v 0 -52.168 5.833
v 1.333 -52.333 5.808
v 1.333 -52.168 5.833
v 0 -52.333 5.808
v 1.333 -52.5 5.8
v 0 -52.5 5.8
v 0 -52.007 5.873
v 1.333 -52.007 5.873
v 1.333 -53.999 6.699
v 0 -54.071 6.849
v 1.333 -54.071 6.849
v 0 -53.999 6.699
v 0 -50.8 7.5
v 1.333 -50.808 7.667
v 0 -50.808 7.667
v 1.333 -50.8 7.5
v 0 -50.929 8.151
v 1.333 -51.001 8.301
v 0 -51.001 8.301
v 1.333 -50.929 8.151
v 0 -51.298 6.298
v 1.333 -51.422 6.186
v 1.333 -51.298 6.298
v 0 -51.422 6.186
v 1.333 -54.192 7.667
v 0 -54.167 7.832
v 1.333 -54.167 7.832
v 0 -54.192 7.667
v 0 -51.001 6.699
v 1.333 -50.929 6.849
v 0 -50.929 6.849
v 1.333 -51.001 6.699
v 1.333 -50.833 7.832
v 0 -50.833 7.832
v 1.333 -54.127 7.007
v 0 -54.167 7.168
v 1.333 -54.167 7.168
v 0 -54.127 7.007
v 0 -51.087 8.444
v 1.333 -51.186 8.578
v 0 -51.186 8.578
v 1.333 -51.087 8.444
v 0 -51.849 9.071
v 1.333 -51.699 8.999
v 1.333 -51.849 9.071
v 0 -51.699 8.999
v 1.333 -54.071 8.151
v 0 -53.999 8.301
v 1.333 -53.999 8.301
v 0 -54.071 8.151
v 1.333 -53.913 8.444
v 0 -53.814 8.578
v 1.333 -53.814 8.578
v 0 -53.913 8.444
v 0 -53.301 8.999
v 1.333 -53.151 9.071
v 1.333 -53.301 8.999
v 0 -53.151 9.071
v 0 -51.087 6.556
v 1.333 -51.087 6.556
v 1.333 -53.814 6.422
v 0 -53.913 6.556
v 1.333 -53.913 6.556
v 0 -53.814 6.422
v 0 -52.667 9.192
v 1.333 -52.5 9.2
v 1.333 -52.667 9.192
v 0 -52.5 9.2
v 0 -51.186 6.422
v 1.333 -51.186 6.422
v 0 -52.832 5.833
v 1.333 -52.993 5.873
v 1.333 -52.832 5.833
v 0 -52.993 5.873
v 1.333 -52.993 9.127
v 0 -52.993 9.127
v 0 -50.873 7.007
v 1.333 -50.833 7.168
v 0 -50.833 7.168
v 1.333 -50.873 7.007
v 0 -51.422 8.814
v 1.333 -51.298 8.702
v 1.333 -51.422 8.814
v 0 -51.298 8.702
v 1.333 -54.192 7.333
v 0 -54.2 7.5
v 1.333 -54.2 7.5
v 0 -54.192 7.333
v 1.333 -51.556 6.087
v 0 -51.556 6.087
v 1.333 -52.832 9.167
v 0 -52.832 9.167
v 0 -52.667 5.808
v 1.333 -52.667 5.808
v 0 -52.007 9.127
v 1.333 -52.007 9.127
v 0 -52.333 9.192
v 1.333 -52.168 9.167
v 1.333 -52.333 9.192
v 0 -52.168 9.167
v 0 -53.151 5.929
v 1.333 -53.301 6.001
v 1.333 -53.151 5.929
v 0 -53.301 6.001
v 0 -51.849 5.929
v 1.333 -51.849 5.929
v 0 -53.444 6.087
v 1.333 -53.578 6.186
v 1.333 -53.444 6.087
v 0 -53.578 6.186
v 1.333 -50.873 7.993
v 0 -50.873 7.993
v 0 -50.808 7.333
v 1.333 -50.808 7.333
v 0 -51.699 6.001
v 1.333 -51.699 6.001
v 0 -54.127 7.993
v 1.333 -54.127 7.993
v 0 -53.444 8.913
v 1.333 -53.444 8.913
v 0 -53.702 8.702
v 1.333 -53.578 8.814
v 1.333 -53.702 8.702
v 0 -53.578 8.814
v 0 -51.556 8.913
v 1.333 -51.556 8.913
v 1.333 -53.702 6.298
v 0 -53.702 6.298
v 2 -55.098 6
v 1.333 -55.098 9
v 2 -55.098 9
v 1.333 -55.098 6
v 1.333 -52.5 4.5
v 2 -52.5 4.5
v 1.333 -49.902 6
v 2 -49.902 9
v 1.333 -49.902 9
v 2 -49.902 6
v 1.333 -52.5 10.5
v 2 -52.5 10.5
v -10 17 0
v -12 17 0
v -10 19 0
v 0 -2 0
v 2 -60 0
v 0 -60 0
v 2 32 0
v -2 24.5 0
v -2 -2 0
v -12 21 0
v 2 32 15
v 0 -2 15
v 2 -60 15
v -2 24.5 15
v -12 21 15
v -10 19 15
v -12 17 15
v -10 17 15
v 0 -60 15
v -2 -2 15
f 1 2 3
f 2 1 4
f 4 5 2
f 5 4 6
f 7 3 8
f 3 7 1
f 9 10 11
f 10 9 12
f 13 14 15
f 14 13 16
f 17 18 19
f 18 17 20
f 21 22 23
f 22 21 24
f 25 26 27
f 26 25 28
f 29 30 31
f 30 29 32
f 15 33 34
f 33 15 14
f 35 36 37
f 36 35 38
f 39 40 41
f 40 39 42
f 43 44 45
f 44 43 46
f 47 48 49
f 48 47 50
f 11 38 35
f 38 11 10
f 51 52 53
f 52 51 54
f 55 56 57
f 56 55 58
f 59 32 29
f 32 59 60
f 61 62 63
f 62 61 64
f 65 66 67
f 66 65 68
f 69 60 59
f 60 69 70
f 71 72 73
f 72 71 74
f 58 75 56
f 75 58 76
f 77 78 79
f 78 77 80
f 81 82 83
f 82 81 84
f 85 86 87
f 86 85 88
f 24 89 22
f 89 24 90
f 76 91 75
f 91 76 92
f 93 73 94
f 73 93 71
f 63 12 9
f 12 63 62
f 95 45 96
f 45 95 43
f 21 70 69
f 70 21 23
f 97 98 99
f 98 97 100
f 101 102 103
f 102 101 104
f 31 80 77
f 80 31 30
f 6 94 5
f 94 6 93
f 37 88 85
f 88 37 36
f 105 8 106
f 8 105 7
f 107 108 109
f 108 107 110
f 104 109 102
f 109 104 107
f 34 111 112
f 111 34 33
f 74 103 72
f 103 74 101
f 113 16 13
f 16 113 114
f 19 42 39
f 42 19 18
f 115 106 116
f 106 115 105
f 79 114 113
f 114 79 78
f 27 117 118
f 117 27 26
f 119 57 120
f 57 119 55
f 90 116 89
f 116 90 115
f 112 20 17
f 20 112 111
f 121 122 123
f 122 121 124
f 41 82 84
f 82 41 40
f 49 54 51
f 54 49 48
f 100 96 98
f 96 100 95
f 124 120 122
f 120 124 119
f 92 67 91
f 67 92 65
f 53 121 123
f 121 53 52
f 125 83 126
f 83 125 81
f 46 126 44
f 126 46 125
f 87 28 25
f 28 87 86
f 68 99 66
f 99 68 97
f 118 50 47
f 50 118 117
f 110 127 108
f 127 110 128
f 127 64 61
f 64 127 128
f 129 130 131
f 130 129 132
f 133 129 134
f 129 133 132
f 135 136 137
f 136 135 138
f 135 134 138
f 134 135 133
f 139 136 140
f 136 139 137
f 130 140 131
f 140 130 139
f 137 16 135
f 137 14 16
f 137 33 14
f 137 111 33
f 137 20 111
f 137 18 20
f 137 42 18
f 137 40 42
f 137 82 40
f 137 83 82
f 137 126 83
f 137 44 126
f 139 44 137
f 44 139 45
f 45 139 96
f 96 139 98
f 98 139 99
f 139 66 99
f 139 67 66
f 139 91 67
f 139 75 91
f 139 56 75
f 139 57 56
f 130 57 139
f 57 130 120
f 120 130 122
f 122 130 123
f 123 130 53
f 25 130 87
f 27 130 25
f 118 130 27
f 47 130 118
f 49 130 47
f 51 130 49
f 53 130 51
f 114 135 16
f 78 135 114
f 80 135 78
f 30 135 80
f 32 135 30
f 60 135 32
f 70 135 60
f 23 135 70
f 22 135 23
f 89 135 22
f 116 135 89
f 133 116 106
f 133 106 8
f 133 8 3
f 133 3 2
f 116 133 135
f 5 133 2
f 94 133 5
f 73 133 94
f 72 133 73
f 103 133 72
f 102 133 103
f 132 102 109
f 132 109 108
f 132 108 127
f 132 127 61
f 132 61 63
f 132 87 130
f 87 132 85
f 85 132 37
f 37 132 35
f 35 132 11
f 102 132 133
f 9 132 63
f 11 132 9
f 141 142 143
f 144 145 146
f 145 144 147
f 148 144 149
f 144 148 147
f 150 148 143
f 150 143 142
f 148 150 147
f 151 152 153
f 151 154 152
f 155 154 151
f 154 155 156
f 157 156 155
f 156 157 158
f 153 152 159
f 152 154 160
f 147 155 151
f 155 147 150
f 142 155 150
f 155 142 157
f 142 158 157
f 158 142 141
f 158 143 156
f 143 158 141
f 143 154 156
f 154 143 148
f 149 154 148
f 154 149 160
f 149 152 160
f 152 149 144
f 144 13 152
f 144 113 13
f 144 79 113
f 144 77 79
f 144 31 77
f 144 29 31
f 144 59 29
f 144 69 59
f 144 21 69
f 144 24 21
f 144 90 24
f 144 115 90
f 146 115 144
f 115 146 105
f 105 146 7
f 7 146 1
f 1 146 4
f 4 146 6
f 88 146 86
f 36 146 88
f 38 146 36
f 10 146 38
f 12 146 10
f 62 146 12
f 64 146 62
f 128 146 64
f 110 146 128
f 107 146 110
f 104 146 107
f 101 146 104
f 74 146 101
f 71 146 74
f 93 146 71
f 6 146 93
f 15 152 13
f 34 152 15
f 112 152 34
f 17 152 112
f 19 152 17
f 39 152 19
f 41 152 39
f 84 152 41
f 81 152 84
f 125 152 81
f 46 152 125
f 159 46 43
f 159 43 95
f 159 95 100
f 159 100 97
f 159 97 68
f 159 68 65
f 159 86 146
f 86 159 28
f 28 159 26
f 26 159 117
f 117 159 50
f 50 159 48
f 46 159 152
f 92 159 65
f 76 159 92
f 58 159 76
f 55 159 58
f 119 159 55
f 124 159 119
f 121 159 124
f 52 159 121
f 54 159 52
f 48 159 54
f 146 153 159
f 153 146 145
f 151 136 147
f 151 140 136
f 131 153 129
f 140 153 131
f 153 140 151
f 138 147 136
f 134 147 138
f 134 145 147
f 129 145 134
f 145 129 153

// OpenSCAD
$fn=64;

L=60;
I=2;
Z0=0;
W=2.0;
SPX=-W/2;
Z1=14+SPX;
Z2=18+SPX;
K=10;

FADE=15;

F=Z2+FADE;

CLAMP_W1=0;
CLAMP_W2=10;

HEIGHT=15;


module aux() {
    translate([-CLAMP_W2,Z2-W,0])
    cube([CLAMP_W2/2,1,HEIGHT]);
}

//(false)
mode="main";
if(mode=="aux") {
    rotate(90,[1,0,0])
    aux();
}
if(mode == "main")
difference() {
linear_extrude(HEIGHT)
polygon([
    [-I-CLAMP_W1,-W],
    [0,-W],
    [0,-L], [W,-L],
    [W,Z2+FADE],
    [-I-CLAMP_W2,Z2+2*W],
    [-I-CLAMP_W2,Z2],
    [-I-CLAMP_W2+W,Z2],
    [-I-CLAMP_W2+W,Z2+W],
    [-I,Z2+FADE/2],
    [-I,Z1],
    [-I,Z0],
    [-I-CLAMP_W1,Z0],
]);

    translate([0,-L+HEIGHT/2,HEIGHT/2])
    rotate(90,[0,1,0]) {
        cylinder(d=3.4,h=20,center=true);
        translate([0,0,W*2/3])
        cylinder($fn=6.2,d=6,h=20);
    }


}

S=50;
{
%        aux();
%translate([-S/2-I-.5,0,0])
rotate(-90,[1,0,0])
rotate(45){
    
    cylinder($fn=4,h=Z1,d=S*sqrt(2));
    translate([0,0,Z1])
    cylinder($fn=4,h=Z2-Z1,d1=S*sqrt(2),d2=(S-2*K)*sqrt(2));
}
}
